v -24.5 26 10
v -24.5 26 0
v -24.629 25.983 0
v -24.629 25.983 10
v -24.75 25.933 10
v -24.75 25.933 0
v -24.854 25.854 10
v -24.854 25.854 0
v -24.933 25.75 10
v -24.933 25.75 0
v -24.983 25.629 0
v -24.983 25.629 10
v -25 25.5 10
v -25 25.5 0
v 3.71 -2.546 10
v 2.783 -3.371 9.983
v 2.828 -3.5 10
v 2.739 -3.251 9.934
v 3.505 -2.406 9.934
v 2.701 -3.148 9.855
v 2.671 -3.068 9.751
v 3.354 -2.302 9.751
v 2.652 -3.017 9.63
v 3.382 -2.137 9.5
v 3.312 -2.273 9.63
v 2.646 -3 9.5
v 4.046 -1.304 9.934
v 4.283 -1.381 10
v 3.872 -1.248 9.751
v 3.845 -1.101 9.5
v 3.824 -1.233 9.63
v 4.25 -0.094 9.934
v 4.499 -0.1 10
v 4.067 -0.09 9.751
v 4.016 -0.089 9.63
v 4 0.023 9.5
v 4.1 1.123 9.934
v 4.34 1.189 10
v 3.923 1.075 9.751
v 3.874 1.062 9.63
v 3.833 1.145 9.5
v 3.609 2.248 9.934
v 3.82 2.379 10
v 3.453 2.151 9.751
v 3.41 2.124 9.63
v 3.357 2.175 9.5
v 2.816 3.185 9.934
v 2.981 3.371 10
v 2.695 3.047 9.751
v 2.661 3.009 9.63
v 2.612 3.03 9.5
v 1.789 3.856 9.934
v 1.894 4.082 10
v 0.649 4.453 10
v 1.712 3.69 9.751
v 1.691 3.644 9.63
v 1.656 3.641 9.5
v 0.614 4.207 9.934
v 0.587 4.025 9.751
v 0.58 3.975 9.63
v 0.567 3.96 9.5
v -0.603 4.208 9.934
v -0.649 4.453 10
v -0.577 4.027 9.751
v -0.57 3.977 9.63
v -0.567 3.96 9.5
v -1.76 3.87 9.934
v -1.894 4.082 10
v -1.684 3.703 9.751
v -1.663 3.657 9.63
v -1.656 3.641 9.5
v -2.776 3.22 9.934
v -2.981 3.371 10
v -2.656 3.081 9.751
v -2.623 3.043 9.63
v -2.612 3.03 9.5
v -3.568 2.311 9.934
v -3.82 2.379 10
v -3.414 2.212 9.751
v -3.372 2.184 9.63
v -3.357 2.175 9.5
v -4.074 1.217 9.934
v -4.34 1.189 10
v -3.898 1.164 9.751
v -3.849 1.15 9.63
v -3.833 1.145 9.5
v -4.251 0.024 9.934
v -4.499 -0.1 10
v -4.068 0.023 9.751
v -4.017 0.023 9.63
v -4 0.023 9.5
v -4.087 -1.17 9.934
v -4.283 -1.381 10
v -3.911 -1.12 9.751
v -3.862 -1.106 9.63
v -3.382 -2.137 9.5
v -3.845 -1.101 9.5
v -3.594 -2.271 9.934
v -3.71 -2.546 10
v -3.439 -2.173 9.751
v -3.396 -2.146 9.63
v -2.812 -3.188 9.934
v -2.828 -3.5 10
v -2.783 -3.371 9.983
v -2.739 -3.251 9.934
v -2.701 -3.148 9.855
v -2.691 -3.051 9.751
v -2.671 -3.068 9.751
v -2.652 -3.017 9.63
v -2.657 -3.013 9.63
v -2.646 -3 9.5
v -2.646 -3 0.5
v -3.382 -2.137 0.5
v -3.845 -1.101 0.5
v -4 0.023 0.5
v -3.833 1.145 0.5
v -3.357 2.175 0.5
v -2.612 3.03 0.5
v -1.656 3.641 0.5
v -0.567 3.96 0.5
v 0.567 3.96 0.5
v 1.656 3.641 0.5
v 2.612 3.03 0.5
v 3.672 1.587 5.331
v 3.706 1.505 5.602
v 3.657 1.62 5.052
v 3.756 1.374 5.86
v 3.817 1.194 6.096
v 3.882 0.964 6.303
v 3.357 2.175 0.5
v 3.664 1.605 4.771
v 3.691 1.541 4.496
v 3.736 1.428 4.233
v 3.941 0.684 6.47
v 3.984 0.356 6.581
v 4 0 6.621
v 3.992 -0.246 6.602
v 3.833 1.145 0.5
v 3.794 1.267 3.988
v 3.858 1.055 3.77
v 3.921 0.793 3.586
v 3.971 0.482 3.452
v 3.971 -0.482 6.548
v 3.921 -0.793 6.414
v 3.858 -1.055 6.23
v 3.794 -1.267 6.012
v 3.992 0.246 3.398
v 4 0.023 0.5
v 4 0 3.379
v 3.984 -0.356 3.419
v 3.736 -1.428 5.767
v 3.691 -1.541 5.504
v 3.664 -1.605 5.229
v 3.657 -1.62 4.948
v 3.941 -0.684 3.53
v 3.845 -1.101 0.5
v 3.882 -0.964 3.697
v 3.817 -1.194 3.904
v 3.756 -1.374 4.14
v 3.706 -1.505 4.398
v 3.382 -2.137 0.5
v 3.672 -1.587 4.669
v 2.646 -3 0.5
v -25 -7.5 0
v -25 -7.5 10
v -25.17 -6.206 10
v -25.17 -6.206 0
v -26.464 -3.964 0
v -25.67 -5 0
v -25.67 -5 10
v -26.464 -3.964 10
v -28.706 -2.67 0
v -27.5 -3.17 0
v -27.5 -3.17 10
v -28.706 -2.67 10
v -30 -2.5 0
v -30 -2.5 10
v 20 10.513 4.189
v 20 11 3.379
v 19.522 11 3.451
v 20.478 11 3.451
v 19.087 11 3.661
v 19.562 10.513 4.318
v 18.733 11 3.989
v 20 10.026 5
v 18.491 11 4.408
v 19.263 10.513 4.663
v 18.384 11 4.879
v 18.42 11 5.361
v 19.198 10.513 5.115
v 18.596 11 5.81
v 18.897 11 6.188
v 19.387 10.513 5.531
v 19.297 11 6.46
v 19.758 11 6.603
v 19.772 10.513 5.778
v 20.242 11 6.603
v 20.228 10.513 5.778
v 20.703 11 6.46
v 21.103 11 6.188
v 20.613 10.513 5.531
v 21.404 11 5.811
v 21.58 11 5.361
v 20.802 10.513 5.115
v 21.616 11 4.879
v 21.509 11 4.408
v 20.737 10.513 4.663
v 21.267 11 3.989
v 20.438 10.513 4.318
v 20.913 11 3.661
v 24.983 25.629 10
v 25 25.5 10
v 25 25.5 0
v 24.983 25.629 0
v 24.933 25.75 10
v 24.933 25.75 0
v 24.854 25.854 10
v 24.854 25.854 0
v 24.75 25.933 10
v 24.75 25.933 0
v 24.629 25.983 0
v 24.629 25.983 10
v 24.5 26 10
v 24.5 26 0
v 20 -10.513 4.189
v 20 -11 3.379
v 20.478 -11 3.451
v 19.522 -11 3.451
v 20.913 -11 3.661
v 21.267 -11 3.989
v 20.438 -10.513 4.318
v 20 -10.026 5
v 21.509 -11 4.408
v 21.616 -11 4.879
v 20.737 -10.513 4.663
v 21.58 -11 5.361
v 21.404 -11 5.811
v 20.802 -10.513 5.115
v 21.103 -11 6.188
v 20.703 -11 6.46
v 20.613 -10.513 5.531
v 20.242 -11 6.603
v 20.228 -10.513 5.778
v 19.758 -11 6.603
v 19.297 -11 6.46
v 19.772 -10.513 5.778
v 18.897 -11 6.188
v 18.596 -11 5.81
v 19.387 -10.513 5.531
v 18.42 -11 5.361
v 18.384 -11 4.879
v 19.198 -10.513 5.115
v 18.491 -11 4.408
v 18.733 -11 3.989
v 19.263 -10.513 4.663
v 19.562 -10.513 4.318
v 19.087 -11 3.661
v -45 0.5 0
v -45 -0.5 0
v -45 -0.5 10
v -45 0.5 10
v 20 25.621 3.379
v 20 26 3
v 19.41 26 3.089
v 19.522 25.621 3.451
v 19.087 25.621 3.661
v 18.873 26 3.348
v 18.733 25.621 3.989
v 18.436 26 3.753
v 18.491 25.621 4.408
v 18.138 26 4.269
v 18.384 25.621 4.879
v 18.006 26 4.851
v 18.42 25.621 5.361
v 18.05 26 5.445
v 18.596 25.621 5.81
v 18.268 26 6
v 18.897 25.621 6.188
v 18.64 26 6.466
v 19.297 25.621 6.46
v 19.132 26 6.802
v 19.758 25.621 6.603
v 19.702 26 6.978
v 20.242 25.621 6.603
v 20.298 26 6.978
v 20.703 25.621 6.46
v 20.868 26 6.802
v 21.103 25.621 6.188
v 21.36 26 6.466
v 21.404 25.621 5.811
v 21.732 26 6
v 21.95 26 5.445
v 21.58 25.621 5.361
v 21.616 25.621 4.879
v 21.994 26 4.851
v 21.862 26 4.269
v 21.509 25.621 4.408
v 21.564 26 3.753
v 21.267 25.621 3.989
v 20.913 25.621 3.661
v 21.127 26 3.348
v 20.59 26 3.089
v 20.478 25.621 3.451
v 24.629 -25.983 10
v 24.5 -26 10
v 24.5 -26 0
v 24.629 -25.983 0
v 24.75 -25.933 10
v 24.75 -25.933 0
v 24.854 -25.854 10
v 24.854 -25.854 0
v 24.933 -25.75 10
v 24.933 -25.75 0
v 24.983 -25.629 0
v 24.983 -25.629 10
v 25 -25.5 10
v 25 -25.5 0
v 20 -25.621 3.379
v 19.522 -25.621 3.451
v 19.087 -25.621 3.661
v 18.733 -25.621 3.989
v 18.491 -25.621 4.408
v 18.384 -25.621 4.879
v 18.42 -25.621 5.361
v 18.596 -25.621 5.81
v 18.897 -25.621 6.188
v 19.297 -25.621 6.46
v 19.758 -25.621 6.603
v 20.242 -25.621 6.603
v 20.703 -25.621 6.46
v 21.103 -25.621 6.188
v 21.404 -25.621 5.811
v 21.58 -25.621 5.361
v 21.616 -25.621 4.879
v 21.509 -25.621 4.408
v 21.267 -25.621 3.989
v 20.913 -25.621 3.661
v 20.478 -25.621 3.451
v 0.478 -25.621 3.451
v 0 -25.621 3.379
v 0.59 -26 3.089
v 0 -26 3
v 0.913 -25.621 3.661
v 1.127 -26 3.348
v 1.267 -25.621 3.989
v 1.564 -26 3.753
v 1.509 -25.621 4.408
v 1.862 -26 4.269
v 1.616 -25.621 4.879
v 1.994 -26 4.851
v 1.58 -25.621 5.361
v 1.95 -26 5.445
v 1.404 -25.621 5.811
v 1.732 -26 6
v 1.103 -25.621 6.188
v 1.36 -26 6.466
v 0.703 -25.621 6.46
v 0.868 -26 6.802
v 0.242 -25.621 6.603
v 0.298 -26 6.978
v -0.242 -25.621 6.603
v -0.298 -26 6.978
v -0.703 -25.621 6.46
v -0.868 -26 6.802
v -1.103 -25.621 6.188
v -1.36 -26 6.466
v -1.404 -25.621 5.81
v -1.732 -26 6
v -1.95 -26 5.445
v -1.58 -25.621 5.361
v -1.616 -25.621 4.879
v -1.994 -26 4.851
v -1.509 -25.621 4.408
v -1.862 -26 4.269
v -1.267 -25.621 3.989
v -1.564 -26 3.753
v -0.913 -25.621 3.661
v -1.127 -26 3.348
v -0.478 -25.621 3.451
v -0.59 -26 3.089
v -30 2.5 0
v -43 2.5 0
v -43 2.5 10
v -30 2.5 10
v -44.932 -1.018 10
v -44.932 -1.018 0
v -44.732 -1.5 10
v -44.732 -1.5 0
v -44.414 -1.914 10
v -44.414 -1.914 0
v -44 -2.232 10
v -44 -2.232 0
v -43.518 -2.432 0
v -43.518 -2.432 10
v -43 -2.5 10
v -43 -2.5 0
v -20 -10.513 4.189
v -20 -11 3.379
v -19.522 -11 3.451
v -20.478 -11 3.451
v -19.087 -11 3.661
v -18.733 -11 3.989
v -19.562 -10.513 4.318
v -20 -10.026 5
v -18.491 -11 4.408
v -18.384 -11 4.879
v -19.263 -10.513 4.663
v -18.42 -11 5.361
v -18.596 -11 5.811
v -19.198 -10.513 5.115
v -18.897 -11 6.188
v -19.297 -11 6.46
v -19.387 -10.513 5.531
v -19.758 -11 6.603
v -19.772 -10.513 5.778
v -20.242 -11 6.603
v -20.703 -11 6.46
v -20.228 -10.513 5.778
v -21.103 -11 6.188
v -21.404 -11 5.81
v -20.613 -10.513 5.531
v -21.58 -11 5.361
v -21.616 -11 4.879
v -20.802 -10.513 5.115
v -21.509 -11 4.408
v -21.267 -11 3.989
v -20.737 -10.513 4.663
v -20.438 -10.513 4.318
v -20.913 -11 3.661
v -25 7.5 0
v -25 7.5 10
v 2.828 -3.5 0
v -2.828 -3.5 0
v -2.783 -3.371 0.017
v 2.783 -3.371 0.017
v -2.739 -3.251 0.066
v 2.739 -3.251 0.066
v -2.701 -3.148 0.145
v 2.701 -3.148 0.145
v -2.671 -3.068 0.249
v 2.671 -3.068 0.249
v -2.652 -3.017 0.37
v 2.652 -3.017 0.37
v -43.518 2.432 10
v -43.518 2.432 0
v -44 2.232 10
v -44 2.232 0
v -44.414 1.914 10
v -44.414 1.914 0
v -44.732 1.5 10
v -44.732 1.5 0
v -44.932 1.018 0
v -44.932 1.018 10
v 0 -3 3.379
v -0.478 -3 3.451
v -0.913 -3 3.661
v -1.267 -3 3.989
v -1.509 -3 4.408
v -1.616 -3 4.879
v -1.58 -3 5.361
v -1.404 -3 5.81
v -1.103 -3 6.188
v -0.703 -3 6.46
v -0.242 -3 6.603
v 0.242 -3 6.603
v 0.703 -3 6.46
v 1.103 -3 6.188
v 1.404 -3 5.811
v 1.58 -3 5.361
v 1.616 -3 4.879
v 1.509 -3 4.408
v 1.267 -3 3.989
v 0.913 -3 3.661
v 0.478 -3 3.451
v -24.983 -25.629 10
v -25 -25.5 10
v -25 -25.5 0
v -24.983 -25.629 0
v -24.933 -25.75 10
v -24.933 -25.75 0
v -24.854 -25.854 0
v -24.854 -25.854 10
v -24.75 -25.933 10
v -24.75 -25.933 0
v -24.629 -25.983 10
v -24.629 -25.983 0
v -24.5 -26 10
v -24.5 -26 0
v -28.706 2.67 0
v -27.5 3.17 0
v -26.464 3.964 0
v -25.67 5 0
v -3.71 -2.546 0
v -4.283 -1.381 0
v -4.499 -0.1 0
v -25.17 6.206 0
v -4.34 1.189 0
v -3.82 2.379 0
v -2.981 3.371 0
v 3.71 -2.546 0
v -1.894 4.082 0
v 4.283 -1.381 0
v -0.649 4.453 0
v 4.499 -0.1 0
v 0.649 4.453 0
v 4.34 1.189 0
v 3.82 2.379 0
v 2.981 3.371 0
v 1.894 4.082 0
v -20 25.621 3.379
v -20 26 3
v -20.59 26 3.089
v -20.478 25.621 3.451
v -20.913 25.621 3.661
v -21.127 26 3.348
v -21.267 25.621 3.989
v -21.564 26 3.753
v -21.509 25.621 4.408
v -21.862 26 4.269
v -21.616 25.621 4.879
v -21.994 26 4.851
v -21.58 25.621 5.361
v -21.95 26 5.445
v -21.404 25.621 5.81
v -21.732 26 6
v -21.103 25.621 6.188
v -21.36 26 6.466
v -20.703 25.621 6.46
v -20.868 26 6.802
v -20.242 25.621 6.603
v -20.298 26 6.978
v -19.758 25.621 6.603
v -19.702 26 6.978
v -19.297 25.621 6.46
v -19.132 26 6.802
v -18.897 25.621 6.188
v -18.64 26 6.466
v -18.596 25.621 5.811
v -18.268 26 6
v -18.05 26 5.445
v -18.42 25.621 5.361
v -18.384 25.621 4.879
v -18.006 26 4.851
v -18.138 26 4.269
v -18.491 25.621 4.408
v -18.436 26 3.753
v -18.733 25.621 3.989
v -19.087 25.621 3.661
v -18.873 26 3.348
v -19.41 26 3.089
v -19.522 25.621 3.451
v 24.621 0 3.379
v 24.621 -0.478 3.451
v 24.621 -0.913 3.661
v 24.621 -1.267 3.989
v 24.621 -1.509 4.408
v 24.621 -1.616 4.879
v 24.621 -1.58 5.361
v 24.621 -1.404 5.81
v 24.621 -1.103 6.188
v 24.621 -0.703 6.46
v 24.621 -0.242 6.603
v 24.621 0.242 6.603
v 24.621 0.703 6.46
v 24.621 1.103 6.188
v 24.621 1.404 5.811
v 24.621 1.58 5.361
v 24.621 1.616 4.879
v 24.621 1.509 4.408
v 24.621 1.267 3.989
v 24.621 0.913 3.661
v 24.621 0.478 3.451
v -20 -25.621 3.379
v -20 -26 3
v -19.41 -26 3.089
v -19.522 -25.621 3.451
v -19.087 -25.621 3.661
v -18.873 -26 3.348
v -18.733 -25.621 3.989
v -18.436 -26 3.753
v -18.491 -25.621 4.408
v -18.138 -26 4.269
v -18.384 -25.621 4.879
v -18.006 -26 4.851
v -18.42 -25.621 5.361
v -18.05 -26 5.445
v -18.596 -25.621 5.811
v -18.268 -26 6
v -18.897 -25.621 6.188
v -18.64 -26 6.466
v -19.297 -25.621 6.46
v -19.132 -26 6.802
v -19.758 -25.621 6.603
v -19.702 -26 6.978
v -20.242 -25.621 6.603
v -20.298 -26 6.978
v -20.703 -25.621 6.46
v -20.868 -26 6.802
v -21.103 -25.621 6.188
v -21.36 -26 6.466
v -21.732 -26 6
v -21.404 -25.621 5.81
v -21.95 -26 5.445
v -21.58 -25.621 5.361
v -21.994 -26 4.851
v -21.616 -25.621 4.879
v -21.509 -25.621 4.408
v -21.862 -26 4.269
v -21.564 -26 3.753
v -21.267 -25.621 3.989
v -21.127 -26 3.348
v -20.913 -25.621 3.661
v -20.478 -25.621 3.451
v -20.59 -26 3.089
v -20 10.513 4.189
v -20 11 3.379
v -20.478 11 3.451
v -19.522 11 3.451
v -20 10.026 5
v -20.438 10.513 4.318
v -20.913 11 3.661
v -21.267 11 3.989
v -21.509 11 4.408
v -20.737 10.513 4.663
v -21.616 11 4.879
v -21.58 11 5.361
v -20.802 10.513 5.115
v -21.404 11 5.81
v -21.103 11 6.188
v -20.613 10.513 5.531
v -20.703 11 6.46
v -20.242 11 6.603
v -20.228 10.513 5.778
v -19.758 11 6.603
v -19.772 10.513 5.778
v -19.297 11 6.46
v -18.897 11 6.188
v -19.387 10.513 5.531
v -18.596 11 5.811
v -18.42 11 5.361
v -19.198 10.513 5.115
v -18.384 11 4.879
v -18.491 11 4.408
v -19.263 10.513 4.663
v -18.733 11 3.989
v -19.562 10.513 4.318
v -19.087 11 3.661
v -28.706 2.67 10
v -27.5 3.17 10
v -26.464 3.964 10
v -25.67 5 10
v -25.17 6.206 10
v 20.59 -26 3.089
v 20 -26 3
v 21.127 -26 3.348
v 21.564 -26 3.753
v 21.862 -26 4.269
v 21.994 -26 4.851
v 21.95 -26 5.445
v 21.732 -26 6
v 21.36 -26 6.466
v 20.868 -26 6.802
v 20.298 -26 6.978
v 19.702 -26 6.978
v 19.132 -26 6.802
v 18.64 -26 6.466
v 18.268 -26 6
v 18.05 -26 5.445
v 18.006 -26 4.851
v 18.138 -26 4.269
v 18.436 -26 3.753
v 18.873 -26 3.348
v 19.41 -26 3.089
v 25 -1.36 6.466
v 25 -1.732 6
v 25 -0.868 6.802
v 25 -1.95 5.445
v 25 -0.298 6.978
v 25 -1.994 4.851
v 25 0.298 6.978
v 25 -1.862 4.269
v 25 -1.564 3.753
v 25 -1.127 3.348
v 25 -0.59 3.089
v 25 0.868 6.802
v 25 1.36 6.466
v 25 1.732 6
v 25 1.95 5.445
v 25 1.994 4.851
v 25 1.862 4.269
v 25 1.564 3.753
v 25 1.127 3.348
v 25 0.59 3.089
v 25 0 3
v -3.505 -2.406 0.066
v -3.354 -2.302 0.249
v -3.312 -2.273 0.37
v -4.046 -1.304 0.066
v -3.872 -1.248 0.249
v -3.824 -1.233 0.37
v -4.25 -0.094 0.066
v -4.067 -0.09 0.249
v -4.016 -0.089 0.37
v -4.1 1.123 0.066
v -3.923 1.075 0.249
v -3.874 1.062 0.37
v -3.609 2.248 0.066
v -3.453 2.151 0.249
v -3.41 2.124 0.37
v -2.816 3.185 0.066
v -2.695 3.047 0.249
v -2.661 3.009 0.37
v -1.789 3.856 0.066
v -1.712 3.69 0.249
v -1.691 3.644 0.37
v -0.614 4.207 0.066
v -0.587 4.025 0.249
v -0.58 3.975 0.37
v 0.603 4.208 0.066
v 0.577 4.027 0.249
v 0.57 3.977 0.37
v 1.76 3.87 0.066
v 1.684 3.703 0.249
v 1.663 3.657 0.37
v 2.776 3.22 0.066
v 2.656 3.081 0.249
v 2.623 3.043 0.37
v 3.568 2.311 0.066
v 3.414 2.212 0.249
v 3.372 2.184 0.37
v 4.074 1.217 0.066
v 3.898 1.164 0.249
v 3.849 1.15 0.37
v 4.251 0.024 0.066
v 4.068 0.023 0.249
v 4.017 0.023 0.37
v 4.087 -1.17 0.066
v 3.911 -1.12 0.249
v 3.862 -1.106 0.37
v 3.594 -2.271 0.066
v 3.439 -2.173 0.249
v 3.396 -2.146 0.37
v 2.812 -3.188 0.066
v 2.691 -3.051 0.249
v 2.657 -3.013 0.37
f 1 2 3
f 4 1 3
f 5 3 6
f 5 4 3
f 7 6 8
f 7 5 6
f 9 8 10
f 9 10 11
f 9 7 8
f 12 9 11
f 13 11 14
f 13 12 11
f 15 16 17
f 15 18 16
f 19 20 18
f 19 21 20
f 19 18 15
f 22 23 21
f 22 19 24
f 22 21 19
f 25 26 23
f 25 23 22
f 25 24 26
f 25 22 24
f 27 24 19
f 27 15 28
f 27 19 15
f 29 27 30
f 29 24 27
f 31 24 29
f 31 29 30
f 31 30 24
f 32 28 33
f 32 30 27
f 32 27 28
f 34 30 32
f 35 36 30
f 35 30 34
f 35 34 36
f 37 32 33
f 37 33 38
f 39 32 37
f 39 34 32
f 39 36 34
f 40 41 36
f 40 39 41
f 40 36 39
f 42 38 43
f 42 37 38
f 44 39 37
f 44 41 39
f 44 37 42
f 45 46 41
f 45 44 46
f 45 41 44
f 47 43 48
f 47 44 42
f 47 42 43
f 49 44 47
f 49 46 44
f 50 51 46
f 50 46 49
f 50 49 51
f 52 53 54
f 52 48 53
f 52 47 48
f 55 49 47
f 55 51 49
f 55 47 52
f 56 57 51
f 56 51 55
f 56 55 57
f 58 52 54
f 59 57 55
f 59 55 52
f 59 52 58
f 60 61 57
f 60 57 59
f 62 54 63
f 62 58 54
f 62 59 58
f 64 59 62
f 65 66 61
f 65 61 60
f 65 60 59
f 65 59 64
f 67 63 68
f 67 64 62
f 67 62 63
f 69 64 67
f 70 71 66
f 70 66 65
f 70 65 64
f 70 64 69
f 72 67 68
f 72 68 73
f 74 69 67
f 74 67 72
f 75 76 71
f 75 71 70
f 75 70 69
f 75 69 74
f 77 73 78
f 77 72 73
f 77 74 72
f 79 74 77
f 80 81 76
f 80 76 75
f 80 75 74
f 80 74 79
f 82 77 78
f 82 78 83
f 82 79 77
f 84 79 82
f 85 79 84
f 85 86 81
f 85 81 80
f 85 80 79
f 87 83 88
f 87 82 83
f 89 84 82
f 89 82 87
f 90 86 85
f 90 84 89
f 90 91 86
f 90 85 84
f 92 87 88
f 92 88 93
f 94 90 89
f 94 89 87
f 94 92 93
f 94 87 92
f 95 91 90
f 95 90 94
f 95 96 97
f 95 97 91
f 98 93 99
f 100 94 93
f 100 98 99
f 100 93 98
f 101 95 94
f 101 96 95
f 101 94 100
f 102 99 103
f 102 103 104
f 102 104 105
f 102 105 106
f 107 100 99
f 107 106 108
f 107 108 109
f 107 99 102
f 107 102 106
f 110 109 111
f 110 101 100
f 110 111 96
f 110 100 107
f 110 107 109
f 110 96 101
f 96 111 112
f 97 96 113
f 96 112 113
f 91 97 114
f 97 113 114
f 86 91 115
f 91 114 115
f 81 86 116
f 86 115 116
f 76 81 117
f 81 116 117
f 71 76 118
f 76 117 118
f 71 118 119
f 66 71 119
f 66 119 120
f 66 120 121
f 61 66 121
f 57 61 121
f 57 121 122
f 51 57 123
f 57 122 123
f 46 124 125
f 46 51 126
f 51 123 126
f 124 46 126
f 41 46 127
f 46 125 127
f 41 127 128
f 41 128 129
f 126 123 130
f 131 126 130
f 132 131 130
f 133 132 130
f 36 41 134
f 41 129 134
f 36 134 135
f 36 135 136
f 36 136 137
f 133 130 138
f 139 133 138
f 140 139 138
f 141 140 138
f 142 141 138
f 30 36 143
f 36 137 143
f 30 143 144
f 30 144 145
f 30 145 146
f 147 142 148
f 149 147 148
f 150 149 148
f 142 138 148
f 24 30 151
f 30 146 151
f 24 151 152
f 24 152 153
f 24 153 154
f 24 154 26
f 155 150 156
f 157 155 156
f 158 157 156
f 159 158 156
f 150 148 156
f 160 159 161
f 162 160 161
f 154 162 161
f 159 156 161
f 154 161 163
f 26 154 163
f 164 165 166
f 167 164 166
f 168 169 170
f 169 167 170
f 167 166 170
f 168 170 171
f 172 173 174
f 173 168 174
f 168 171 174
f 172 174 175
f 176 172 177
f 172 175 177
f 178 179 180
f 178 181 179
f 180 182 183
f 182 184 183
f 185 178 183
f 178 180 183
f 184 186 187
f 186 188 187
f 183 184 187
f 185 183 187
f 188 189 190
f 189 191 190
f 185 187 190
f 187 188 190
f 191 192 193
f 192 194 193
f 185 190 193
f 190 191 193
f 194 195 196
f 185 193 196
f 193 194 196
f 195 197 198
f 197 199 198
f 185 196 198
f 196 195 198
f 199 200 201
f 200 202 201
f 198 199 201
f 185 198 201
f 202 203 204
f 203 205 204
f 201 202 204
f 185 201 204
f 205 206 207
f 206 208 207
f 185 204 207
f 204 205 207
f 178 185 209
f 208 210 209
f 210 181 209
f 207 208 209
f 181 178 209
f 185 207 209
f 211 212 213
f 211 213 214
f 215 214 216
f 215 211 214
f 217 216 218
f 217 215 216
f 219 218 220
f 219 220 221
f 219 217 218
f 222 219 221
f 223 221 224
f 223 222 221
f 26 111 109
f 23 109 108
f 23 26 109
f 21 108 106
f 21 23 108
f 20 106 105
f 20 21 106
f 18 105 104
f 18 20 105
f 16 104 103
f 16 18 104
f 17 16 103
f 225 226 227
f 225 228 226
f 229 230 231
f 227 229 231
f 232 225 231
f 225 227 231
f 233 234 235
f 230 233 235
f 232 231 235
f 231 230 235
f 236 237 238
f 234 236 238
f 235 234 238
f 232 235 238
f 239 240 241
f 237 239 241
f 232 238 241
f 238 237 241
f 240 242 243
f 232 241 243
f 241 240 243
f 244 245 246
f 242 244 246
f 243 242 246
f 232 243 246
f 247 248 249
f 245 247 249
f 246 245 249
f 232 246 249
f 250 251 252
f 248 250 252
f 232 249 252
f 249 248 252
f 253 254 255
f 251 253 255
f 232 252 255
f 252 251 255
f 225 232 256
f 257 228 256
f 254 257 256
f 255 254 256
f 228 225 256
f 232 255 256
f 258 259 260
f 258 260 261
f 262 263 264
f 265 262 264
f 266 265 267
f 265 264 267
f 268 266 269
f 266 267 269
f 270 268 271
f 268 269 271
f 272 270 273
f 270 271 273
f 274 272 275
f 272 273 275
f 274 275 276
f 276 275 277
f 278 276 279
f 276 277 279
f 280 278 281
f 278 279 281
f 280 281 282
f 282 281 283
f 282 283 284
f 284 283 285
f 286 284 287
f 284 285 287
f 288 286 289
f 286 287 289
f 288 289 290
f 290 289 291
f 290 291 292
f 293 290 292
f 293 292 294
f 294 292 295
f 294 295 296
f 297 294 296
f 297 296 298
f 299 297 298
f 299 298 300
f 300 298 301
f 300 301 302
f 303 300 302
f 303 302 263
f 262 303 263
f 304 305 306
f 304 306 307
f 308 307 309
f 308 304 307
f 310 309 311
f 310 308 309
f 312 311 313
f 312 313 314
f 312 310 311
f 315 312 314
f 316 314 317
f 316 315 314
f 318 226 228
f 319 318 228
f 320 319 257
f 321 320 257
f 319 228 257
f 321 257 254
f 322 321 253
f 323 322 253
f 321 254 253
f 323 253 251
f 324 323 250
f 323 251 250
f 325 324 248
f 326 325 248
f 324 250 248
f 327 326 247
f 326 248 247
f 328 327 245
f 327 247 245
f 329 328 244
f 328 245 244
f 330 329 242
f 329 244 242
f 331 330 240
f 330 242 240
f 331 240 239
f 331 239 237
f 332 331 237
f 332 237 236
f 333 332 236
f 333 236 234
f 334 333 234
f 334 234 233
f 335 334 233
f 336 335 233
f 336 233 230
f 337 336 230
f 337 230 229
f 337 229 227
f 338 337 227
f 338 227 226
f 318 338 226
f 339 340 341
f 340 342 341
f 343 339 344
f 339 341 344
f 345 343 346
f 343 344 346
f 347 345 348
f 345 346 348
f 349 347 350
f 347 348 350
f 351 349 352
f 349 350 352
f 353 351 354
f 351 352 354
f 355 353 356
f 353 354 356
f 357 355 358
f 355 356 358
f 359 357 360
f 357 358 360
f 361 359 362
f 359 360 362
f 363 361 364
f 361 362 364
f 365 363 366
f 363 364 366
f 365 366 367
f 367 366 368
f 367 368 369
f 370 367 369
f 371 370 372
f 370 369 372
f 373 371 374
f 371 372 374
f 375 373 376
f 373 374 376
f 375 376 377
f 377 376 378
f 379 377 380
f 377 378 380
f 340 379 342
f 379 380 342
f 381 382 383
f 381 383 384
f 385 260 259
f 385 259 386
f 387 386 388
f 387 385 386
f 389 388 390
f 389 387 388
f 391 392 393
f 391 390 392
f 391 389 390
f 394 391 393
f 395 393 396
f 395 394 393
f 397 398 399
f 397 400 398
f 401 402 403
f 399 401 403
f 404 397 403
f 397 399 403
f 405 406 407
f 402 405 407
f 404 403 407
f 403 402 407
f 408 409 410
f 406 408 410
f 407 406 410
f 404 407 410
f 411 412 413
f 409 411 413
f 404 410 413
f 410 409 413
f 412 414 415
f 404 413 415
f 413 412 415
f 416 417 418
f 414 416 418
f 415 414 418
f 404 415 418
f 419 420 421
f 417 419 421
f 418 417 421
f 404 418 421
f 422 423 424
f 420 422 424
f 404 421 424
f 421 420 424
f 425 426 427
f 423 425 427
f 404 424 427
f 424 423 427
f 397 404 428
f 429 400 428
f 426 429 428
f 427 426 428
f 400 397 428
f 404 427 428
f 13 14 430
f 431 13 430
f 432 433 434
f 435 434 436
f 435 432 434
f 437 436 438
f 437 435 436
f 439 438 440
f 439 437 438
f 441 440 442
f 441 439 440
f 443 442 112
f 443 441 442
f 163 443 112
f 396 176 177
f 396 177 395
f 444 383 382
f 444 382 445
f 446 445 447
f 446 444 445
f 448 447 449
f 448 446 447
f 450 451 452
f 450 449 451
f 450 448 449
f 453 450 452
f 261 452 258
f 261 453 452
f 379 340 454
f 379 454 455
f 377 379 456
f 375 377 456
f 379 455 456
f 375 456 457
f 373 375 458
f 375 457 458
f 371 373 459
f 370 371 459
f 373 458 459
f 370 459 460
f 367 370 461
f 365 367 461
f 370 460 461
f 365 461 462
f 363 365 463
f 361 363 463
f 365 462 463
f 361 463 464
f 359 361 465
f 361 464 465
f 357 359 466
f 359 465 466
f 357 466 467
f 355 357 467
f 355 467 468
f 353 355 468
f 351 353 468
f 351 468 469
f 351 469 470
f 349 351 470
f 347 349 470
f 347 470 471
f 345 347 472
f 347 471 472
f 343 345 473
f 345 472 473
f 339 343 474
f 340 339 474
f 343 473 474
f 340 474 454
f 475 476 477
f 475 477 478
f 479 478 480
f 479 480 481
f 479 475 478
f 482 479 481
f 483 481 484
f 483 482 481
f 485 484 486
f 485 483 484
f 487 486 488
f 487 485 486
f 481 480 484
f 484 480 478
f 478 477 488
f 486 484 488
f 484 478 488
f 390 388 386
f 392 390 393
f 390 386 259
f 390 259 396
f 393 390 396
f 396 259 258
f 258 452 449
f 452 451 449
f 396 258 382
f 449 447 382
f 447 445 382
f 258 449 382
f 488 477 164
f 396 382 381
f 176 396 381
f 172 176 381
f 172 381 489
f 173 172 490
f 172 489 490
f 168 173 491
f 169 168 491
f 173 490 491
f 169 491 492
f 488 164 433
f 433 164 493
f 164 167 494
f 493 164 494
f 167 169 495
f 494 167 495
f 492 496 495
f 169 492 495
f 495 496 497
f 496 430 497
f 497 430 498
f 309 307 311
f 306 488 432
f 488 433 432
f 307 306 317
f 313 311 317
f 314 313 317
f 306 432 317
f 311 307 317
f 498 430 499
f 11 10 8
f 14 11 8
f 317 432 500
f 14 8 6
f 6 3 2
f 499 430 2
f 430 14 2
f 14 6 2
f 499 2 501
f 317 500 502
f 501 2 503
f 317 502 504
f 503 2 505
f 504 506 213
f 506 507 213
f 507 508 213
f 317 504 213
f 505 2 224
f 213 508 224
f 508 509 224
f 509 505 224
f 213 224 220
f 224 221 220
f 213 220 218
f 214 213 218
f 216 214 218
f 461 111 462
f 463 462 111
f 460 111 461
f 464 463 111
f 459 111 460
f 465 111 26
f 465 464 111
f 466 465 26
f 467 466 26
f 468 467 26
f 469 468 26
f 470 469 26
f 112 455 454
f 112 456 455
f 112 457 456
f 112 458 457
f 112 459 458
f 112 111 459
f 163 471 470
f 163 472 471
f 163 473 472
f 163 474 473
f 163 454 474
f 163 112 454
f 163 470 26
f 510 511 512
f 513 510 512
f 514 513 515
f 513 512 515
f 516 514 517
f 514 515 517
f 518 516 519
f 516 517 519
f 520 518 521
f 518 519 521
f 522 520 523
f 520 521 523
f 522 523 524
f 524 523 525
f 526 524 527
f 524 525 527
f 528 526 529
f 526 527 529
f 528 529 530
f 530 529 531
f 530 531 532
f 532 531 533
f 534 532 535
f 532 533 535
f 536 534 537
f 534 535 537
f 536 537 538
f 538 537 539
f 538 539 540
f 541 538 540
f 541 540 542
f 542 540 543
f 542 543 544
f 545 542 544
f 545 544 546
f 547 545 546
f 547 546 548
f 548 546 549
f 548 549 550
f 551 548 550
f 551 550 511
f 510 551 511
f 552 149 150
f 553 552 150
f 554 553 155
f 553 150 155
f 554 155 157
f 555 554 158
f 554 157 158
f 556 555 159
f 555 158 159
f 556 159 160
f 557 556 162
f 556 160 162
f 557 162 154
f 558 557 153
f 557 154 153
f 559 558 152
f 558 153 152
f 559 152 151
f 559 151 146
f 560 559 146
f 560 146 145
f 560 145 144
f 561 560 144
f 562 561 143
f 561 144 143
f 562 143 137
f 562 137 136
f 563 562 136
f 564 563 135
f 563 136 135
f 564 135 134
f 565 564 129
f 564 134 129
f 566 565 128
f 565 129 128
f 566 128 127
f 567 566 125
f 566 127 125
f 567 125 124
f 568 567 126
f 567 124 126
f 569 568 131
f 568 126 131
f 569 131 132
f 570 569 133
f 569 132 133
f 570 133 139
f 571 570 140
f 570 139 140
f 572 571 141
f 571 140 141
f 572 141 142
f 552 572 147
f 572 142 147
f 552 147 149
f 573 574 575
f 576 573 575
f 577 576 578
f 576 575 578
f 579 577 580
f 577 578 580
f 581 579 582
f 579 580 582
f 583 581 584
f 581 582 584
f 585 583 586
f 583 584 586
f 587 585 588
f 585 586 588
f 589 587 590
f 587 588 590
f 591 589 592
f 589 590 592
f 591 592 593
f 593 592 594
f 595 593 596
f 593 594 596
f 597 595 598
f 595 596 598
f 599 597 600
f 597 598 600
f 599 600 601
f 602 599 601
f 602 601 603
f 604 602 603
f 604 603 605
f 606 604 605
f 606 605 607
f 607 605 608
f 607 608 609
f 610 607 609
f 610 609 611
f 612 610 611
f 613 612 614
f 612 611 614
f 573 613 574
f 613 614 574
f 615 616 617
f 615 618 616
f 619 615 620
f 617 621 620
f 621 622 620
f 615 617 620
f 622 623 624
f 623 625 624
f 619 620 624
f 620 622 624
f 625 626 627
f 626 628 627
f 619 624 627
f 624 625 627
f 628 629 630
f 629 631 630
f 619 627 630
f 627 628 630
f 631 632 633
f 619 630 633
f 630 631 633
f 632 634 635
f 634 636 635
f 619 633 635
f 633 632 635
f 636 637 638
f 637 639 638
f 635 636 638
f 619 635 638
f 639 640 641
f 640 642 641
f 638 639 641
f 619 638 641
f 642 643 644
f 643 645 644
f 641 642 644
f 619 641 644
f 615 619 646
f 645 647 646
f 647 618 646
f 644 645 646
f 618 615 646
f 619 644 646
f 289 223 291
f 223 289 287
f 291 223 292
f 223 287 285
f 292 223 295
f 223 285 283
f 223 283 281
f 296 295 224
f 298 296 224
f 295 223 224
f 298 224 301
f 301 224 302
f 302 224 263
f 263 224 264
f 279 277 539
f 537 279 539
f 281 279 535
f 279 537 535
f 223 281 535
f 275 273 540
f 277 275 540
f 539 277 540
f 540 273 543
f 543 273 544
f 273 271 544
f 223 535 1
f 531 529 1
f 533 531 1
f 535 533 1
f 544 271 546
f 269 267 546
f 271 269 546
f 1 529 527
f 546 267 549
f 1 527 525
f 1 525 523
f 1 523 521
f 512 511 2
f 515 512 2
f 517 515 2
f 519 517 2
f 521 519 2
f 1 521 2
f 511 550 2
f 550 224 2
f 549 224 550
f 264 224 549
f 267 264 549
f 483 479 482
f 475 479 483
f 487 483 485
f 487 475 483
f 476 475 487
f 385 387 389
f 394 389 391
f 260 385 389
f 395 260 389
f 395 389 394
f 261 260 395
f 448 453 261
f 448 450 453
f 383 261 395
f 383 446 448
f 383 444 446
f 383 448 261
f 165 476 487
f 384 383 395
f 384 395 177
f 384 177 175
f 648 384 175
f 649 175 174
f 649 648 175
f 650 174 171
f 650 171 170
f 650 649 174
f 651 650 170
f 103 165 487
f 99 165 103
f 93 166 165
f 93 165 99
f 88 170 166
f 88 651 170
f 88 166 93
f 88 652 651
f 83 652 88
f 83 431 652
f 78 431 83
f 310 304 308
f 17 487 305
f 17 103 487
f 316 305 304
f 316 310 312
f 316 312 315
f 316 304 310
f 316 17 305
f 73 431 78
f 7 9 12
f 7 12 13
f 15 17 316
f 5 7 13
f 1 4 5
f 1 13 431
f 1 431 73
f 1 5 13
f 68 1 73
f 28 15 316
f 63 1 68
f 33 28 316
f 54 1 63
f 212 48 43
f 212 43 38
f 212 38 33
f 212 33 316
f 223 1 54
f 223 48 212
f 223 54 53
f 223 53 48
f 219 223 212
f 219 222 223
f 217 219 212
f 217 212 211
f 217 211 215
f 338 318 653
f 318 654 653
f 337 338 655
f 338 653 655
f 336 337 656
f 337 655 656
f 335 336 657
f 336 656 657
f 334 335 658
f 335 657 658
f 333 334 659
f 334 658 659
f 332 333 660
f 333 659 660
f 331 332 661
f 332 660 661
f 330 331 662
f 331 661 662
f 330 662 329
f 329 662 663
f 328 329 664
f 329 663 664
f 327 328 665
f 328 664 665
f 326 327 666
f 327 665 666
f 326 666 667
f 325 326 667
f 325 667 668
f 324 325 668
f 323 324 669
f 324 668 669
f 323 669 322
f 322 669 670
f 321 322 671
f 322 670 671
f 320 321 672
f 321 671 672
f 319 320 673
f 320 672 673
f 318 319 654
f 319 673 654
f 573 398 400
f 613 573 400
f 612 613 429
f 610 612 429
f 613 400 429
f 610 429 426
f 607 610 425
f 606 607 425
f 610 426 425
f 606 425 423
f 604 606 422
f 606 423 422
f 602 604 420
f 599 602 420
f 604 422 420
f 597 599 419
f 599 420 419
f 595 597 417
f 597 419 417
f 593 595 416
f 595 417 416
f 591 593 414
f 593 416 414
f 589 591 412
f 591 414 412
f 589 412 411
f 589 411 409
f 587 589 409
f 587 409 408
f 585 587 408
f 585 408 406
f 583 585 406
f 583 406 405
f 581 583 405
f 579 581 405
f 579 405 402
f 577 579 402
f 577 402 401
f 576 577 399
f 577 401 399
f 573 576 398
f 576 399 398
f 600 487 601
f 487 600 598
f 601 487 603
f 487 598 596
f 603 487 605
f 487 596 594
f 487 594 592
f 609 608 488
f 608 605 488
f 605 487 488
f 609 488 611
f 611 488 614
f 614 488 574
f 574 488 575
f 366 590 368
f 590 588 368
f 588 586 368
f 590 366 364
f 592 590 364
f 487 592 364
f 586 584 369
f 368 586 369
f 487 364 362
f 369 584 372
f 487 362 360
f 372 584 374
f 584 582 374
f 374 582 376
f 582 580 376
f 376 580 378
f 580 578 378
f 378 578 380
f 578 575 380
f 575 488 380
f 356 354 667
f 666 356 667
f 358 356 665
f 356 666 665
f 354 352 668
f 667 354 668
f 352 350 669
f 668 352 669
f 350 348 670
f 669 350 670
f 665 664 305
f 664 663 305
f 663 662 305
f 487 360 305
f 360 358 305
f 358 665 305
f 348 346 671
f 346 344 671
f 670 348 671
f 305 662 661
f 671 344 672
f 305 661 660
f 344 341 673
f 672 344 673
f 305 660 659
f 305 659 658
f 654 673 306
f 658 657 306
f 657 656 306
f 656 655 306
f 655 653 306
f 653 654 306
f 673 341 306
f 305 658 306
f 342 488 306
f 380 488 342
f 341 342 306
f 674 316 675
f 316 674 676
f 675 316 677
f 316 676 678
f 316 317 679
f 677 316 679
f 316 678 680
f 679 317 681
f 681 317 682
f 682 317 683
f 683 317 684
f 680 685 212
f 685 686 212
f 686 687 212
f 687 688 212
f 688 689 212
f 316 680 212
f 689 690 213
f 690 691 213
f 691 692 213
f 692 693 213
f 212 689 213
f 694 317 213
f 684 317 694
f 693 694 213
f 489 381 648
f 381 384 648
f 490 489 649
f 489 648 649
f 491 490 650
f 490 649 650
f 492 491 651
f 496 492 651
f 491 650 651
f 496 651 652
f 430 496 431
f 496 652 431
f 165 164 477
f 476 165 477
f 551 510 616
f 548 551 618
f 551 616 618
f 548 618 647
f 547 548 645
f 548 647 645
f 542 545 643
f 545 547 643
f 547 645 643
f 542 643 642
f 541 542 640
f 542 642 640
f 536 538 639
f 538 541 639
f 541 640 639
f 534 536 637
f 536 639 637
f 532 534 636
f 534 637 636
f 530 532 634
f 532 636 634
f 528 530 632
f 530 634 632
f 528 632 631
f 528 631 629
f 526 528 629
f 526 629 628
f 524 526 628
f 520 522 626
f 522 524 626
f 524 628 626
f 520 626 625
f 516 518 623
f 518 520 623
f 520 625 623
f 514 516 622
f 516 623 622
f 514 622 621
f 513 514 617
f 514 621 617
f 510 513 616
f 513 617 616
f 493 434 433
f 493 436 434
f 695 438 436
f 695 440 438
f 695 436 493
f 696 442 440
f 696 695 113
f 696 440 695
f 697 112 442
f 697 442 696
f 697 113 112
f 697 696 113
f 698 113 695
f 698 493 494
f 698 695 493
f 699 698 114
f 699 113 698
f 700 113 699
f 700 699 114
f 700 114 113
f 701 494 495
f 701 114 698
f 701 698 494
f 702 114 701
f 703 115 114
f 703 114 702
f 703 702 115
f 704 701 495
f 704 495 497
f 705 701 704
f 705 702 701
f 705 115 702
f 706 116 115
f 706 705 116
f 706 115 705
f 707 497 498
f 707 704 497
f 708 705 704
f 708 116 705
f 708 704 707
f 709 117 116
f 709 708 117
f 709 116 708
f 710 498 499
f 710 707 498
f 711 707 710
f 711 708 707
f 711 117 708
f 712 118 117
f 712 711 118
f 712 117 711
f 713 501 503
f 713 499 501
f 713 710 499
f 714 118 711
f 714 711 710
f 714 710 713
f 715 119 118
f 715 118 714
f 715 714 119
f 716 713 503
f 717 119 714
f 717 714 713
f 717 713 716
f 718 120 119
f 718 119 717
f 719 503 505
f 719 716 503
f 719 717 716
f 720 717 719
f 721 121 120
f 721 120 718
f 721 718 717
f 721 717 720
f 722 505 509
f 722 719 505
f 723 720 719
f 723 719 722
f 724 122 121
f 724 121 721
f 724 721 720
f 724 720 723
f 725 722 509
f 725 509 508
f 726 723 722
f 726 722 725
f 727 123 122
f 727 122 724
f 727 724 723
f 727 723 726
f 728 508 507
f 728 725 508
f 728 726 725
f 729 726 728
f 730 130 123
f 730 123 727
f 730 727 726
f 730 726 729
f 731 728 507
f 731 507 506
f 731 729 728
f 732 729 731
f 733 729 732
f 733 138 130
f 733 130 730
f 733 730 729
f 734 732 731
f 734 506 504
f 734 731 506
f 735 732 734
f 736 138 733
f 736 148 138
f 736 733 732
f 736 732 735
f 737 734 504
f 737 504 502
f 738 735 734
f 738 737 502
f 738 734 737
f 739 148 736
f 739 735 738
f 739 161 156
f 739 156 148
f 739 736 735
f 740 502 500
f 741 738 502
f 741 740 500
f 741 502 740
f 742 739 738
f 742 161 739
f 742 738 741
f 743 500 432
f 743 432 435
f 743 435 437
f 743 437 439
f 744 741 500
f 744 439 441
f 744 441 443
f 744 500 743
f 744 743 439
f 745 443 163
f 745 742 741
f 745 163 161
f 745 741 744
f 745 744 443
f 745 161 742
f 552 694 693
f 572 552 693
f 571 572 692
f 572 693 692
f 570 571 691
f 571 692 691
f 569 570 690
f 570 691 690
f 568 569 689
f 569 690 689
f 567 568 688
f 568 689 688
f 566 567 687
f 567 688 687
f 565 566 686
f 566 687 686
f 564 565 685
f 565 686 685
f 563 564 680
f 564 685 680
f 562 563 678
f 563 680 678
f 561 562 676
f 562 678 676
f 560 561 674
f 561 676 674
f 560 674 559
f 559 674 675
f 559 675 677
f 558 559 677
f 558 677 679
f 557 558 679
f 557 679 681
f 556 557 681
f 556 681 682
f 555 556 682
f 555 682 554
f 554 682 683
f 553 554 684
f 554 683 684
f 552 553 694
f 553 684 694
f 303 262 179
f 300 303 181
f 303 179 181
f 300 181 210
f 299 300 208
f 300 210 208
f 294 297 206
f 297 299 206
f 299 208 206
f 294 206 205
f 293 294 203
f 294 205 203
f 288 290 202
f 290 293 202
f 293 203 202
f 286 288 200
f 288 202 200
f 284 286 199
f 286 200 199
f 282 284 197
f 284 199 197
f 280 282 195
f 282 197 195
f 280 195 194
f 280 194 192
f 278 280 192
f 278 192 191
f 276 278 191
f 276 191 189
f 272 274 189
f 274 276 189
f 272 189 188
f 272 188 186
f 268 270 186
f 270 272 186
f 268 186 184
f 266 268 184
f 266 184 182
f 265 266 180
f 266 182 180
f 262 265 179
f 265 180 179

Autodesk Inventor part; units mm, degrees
ref_plane "YZ Plane" through (0, 0, 0) normal (1, 0, 0) x (0, 1, 0)
ref_plane "XZ Plane" through (0, 0, 0) normal (0, 1, 0) x (-1, 0, 0)
ref_plane "XY Plane" through (0, 0, 0) normal (0, 0, 1) x (1, 0, 0)
sketch "Sketch1" plane through (0, 0, 0) normal (0, 0, 1) x (1, 0, 0)
  line L0 (-25, -26) -> (25, -26)
  line L1 (25, -26) -> (25, 26)
  line L2 (25, 26) -> (-25, 26)
  line L3 (-25, 26) -> (-25, -26)
  line L4 (-25, -26) -> (25, 26) construction
  line L5 (25, -26) -> (-25, 26) construction
  circle A0 centre (0, 0) radius 4
  line L6 (-2.6458, -3) -> (2.6458, -3)
  line L7 (-45, 2.5) -> (-5, 2.5)
  line L8 (-5, 2.5) -> (-5, -2.5)
  line L9 (-5, -2.5) -> (-45, -2.5)
  line L10 (-45, -2.5) -> (-45, 2.5)
  line L11 (-45, 2.5) -> (-5, -2.5) construction
  line L12 (-5, 2.5) -> (-45, -2.5) construction
  point P0 (-25, 0)
  point P1 (-25, -2.5)
  point P2 (-25, 2.5)
  dimension "d0" = 50
  dimension "d1" = 52
  dimension "d2" = 8
  dimension "d39" = 3
  dimension "d40" = 20
  dimension "d41" = 5
extrude "Extrusion1" add sketch "Sketch1" along normal blind 10 contours L3 L9 L8 L7 L2 L1 L0 | L9 L10 L7 L3 | L3 L7 L8 L9 | L6 A0 picked at (-0.6179, -3.1815)
sketch "Sketch2" plane through (-25, -26, 0) normal (0, -1, 0) x (1, 0, 0)
  line L0 (0, 0) -> (0, 10) projected
  line L1 (50, 0) -> (50, 10) projected
  line L2 (0, 0) -> (50, 0) projected
  point P0 (25, 0)
  point P1 (0, 5)
  point P2 (45, 5)
  point P3 (25, 5)
  point P4 (5, 5)
  point P5 (0, 5)
  point P6 (50, 5)
  point P7 (25, 0)
  dimension "d19" = 5
  dimension "d20" = 5
hole "Hole1" at (20, -26, 5) at (-20, -26, 5) direction (0, 1, 0) diameter 3.242 depth 15 tip angle 118 countersink diameter 4 countersink angle 90 thread size "M4x0.7" class "6H" standard "ANSI Metric M Profile"
fillet "Fillet2" radius 0.5 8 edges at (0, 4, 10) (-25, -26, 5) (25, -26, 5) (25, 26, 5) (-25, 26, 5) (0, 4, 0) (0, -3, 10) (0, -3, 0)
hole "Hole2" at (0, -26, 5) direction (0, 1, 0) diameter 3.242 end up to surface countersink diameter 4 countersink angle 90 thread size "M4x0.7" class "6H" standard "ANSI Metric M Profile"
mirror "Mirror1" about plane through (0, 0, 0) normal (0, 1, 0) of "Hole1"
sketch "Sketch3" plane through (25, -25.5, 0.5) normal (1, 0, 0) x (0, 0, -1)
  line L0 (-9.5, 51) -> (0.5, 51) projected
  point P0 (0.5, 25.5)
  point P1 (-4.5, 25.5)
  point P2 (-4.5, 51)
  point P3 (-9, 51)
  point P4 (0, 51)
hole "Hole3" at (25, 0, 5) direction (-1, 0, 0) diameter 3.242 end up to surface countersink diameter 4 countersink angle 90 thread size "M4x0.7" class "6H" standard "ANSI Metric M Profile"
fillet "Fillet3" radius 2 2 edges at (-45, 2.5, 5) (-45, -2.5, 5)
fillet "Fillet4" radius 5 2 edges at (-25, -2.5, 5) (-25, 2.5, 5)
properties part number "bevestegingsKoppeling axis4_5" material "Aluminum 6061"
